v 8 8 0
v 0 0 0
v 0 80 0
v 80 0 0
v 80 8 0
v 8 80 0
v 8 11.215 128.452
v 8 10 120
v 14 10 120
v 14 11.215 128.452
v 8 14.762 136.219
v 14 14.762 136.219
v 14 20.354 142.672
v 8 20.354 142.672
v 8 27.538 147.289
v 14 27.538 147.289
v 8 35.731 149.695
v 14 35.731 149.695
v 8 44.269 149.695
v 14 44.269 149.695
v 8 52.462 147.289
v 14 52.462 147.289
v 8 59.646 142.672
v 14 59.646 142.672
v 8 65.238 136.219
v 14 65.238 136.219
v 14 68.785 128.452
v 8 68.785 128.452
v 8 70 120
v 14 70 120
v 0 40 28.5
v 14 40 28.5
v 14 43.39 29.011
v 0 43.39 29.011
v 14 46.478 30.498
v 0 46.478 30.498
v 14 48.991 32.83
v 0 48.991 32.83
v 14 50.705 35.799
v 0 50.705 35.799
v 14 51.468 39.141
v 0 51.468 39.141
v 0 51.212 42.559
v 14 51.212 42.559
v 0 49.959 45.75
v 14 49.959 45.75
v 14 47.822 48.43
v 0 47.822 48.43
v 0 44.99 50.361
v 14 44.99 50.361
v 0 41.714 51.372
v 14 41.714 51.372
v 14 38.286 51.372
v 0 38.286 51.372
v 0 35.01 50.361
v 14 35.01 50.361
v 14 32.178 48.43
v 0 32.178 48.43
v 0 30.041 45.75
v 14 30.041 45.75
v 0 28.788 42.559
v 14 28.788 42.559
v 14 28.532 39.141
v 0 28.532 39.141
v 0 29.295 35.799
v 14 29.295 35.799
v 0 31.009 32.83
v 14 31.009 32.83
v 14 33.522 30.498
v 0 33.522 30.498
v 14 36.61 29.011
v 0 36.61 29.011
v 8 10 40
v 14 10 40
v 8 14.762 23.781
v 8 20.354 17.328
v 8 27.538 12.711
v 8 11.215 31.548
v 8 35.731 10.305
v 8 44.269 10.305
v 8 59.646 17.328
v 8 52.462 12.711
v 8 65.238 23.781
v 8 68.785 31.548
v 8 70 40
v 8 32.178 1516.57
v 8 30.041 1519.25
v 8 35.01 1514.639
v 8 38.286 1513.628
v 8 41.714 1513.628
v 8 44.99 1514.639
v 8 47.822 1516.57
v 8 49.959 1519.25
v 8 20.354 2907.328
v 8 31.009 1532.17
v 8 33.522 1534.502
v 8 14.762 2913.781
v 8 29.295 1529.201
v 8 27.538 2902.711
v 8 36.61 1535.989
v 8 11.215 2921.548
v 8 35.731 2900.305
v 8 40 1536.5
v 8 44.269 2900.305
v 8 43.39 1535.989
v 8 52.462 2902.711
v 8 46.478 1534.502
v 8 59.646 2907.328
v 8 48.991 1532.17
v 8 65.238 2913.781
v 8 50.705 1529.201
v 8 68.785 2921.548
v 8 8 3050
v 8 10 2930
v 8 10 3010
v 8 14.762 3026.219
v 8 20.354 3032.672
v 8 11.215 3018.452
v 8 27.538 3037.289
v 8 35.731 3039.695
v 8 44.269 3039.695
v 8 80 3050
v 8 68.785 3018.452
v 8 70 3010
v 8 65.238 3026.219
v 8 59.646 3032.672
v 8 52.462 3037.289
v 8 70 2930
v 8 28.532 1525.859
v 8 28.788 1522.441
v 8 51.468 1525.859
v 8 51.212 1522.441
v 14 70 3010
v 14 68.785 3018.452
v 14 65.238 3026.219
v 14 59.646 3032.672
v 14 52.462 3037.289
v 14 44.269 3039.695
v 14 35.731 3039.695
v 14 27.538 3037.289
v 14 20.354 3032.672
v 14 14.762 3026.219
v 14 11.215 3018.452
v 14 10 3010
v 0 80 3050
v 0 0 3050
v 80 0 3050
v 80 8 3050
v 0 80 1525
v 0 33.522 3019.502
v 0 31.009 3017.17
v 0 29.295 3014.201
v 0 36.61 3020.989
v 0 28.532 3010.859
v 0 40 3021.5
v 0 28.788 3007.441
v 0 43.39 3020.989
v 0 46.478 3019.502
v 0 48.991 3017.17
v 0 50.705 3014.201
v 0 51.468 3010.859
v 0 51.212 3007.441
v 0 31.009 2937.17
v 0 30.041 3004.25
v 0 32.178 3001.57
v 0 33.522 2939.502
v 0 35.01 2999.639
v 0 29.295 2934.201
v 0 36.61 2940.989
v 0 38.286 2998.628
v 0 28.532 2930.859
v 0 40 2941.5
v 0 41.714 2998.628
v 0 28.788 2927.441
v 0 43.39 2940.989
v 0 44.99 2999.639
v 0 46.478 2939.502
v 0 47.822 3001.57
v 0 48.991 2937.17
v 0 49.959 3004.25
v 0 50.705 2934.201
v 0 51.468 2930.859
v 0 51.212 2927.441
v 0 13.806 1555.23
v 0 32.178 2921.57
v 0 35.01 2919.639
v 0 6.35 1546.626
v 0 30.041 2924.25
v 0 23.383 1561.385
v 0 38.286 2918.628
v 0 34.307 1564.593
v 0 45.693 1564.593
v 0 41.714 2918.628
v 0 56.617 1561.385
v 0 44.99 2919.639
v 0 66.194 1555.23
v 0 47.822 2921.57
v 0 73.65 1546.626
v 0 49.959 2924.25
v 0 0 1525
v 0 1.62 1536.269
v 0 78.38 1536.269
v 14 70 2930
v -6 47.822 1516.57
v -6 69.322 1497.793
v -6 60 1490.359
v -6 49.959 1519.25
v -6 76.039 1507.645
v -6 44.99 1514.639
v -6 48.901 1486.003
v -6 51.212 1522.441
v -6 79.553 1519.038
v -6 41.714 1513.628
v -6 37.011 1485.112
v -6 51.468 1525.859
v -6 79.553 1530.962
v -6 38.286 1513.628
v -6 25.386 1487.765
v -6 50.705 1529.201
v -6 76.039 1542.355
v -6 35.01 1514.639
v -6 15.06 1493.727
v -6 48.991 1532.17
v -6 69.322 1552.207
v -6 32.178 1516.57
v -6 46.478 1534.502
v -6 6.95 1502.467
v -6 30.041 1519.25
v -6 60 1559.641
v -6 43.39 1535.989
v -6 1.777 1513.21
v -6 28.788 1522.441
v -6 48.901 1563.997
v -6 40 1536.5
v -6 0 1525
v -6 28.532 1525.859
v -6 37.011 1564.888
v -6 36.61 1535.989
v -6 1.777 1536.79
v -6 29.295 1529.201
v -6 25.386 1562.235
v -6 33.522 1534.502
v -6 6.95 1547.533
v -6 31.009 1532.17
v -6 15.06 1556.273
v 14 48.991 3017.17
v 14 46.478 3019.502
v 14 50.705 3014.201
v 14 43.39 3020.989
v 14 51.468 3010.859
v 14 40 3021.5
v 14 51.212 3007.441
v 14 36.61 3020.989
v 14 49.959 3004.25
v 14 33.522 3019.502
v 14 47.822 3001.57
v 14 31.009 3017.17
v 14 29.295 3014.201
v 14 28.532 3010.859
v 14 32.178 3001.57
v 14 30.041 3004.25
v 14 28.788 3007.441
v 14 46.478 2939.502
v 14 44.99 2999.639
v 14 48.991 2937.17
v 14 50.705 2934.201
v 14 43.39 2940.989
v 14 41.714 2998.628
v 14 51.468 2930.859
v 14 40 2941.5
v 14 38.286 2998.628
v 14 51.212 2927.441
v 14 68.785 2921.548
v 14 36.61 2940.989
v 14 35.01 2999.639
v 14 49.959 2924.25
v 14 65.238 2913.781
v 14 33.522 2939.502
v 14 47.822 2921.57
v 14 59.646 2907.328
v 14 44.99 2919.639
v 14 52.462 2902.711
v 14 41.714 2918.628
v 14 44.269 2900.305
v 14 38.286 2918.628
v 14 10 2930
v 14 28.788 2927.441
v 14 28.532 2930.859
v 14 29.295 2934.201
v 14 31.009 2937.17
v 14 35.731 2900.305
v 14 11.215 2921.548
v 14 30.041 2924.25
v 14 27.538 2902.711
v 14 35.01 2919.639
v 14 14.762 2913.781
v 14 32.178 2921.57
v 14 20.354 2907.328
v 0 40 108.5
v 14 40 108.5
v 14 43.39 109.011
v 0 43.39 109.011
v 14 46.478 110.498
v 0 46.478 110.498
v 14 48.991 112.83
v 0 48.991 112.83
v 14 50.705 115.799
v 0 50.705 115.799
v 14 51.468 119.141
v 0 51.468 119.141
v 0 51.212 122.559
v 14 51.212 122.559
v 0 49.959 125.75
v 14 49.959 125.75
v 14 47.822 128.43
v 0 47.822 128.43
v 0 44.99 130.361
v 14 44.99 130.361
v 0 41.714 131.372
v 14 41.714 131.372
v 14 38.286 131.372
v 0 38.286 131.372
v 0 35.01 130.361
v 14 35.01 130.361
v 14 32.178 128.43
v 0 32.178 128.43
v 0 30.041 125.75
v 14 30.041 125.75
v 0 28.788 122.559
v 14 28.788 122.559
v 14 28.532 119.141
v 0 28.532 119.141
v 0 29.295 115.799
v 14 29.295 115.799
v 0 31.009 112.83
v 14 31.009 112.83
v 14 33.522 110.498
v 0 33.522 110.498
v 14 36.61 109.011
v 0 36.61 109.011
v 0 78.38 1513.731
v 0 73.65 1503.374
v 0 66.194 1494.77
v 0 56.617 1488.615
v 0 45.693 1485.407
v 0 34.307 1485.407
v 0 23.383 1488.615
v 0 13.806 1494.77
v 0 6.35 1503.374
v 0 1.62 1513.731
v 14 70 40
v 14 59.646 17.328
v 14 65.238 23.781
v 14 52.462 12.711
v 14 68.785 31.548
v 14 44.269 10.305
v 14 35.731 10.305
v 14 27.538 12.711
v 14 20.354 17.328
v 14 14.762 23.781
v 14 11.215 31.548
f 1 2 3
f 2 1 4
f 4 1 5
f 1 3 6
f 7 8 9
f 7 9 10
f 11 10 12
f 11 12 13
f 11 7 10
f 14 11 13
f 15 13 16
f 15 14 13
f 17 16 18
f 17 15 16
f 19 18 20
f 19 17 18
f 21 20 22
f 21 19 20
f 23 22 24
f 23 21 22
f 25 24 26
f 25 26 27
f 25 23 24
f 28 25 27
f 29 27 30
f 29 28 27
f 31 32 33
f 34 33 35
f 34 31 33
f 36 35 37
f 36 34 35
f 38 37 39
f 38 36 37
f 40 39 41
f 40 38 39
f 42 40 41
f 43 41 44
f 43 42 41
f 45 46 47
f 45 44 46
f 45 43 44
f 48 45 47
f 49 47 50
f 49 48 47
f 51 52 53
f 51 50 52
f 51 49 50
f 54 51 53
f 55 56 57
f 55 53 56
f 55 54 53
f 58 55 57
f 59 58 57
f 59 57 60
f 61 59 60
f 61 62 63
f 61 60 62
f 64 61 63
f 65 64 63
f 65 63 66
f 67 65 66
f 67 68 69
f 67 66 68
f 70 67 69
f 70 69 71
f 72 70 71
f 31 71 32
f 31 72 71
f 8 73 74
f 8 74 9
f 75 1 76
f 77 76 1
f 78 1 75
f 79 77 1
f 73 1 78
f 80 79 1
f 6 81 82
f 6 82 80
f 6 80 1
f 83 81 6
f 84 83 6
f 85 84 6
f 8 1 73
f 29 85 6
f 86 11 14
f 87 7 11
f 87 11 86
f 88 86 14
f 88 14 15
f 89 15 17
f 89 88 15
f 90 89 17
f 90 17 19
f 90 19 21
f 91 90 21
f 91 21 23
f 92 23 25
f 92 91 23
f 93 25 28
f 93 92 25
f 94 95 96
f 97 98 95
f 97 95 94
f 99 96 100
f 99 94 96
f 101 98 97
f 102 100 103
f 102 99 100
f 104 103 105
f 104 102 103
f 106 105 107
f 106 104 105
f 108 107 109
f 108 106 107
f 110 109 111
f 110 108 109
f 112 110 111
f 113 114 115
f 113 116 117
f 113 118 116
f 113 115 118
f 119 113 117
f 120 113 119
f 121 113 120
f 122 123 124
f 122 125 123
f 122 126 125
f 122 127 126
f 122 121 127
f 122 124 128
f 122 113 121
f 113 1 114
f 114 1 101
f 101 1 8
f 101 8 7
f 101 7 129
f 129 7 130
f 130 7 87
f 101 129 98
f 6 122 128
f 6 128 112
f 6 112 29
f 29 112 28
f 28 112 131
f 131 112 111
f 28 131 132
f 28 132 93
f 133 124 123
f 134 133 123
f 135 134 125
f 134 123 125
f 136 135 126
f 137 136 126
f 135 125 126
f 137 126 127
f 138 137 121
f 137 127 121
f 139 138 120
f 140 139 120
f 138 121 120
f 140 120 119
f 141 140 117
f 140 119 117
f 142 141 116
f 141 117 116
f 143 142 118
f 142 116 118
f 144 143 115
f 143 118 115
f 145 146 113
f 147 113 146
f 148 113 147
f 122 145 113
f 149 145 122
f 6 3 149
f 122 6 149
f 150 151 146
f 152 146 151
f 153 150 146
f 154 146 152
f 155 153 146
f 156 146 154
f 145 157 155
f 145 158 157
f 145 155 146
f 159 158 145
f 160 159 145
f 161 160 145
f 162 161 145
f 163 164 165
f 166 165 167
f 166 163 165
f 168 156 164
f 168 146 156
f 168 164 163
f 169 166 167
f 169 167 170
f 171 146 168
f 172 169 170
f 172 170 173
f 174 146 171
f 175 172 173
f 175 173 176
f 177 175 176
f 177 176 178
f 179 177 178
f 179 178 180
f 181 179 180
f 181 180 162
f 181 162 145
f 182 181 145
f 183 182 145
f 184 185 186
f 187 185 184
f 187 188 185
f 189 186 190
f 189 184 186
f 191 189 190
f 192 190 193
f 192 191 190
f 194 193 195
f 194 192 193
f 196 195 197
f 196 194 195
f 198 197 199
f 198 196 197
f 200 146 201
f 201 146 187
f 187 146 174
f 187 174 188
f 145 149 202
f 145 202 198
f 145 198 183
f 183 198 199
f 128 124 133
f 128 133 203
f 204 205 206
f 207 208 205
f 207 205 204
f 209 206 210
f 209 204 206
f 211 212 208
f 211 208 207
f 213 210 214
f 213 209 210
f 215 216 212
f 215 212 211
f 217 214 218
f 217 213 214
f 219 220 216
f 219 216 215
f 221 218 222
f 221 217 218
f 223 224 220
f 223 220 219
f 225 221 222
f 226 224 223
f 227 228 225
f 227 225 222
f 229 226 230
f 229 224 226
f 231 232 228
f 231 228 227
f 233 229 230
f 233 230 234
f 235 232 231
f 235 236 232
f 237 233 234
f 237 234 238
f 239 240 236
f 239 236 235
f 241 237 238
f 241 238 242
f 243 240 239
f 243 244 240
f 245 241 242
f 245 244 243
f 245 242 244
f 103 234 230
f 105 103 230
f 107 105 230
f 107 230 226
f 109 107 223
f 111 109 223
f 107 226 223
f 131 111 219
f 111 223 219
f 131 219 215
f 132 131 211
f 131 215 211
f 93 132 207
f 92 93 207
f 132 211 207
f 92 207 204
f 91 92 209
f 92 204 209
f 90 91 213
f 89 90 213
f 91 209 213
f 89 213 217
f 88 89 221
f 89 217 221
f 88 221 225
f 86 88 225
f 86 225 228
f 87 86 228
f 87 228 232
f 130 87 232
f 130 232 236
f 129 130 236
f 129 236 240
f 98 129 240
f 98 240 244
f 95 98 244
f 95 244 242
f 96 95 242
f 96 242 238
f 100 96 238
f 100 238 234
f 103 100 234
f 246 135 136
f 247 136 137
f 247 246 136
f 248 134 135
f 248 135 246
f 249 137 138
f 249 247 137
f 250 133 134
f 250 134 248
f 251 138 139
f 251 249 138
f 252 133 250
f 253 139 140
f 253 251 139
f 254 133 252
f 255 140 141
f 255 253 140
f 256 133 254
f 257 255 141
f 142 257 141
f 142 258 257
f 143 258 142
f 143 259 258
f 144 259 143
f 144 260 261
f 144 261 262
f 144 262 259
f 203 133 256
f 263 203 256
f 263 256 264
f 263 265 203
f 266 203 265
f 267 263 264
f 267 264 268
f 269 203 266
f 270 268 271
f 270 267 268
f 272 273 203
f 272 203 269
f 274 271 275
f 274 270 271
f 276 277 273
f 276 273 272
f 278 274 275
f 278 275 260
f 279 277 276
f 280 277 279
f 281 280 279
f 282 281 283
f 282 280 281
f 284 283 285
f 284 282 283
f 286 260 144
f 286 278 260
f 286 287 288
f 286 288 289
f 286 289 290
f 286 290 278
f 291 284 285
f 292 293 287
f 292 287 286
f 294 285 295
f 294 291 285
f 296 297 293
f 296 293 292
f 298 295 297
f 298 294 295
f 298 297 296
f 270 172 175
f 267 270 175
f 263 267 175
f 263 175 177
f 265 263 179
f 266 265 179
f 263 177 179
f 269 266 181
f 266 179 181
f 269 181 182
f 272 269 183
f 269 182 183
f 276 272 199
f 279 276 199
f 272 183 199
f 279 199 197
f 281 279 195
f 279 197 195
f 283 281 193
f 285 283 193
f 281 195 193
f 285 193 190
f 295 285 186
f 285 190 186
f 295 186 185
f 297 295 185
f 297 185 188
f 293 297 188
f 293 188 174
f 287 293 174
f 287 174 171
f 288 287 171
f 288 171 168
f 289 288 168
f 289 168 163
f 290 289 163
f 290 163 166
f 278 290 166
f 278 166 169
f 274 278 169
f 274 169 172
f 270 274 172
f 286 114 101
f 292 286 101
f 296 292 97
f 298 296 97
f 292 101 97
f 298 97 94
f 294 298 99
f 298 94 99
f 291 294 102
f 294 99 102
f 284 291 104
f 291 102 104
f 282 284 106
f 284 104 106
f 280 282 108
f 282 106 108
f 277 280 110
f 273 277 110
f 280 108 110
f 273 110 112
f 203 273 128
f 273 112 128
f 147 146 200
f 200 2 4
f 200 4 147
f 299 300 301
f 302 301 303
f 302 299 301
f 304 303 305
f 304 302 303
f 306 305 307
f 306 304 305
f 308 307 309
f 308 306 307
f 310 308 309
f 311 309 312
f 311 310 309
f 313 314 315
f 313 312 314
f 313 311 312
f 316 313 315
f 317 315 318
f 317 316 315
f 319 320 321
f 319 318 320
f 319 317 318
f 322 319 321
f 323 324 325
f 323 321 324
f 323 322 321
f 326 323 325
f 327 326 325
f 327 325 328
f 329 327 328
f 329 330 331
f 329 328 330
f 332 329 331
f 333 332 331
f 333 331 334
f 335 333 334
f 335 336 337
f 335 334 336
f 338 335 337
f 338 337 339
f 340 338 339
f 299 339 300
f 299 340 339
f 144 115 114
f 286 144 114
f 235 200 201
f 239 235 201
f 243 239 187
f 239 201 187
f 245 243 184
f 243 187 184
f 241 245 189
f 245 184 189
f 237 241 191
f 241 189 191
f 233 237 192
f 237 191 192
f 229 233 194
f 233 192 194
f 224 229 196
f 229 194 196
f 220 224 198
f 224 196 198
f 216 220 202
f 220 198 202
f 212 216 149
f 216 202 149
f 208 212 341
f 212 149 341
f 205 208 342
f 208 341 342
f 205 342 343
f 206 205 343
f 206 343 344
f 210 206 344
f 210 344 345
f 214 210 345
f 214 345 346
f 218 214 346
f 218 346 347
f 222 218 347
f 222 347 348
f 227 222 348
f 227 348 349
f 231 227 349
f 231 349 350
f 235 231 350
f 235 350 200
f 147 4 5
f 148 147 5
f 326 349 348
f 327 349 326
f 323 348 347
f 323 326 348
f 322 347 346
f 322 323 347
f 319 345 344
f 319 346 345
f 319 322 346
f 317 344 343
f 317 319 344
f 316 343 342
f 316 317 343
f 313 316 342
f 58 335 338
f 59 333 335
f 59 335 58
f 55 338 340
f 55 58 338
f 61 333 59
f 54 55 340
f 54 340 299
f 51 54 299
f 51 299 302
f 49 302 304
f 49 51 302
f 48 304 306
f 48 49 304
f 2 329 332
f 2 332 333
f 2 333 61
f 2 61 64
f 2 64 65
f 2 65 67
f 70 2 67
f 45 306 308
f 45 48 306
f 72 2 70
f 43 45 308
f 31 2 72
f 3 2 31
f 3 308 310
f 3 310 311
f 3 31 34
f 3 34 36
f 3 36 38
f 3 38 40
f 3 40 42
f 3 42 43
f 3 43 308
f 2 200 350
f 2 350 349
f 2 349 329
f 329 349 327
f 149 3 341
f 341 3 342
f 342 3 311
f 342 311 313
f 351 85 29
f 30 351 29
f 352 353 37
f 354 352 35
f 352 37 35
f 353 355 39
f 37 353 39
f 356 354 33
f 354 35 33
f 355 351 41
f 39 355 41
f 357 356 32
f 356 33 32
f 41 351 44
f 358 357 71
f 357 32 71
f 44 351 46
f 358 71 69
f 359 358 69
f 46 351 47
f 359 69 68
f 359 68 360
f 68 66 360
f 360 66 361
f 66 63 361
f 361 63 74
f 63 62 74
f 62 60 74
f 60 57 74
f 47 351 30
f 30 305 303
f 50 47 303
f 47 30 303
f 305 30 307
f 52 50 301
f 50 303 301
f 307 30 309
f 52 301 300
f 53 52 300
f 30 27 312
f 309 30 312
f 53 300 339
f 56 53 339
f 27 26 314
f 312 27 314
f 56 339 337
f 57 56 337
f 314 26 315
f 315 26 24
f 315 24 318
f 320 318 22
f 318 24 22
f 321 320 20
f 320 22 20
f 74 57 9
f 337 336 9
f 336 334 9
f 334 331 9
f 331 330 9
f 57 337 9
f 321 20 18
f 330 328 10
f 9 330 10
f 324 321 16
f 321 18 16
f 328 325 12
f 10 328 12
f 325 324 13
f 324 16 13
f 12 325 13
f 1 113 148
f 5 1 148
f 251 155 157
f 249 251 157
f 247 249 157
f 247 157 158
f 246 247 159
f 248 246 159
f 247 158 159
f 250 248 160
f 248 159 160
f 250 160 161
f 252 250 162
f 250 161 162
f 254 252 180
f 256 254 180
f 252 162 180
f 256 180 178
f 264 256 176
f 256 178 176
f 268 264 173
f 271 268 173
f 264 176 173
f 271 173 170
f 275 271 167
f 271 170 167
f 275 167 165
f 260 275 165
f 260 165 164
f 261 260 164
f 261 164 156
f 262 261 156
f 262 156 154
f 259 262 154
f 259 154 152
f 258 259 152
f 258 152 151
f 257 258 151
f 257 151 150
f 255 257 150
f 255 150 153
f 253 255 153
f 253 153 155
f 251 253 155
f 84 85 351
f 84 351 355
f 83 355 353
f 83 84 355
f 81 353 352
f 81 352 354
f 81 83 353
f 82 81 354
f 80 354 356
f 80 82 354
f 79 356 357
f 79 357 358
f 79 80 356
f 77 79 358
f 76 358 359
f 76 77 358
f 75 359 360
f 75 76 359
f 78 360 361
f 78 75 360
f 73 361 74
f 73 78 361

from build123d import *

# Parameters (mm, degrees)
SKETCH_1_W          = 80
SKETCH_1_H          = 80
EXTRUDE_1_DEPTH     = 3050
SKETCH_2_W          = 72
SKETCH_2_H          = 72
CUT_EXTRUDE_1_DEPTH = 3053.097639329
SKETCH_5_R          = 40
EXTRUDE_2_DEPTH     = 6
SKETCH_6_R          = 11.5
CUT_EXTRUDE_2_DEPTH = 3053.260801439
SKETCH_7_R          = 30
EXTRUDE_3_DEPTH     = 6
SKETCH_8_W          = 80
SKETCH_8_H          = 60
EXTRUDE_4_DEPTH     = 6
SKETCH_9_R          = 11.5
CUT_EXTRUDE_3_DEPTH = 3053.097639329


with BuildPart() as part:
    # 草图1 → 凸台-拉伸1 (new body)
    with BuildSketch(Plane.XY):
        with Locations((40, 40)):
            Rectangle(SKETCH_1_W, SKETCH_1_H)
    extrude(amount=EXTRUDE_1_DEPTH)

    # 草图2 → 切除-拉伸1 (cut, through all)
    with BuildSketch(Plane.XY.offset(3050)):
        with Locations((44, 44)):
            Rectangle(SKETCH_2_W, SKETCH_2_H)
    extrude(amount=-CUT_EXTRUDE_1_DEPTH, mode=Mode.SUBTRACT)

    # 草图5 → 凸台-拉伸2 (add)
    with BuildSketch(Plane.ZY):
        with Locations(Location((1525, 40, 0), (0, 0, 270))):
            Circle(SKETCH_5_R)
    extrude(amount=EXTRUDE_2_DEPTH)

    # 草图6 → 切除-拉伸2 (cut, through all)
    with BuildSketch(Plane.ZY.offset(6)):
        with Locations((1525, 40)):
            Circle(SKETCH_6_R)
    extrude(amount=-CUT_EXTRUDE_2_DEPTH, mode=Mode.SUBTRACT)

    # 草图7 → 凸台-拉伸3 (add)
    with BuildSketch(Plane(origin=(8, 0, 0), x_dir=(0, 0, -1), z_dir=(1, 0, 0))):
        with Locations(Location((-3010, 40, 0), (0, 0, 270))):
            Circle(SKETCH_7_R)
        with Locations(Location((-2930, 40, 0), (0, 0, 270))):
            Circle(SKETCH_7_R)
    extrude_3 = extrude(amount=EXTRUDE_3_DEPTH)

    # 草图8 → 凸台-拉伸4 (add)
    with BuildSketch(Plane(origin=(8, 0, 0), x_dir=(0, 0, -1), z_dir=(1, 0, 0))):
        with Locations((-2970, 40)):
            Rectangle(SKETCH_8_W, SKETCH_8_H)
    extrude_4 = extrude(amount=EXTRUDE_4_DEPTH)

    # 草图9 → 切除-拉伸3 (cut, through all)
    with BuildSketch(Plane.ZY):
        with Locations((3010, 40)):
            Circle(SKETCH_9_R)
        with Locations((2930, 40)):
            Circle(SKETCH_9_R)
    cut_extrude_3 = extrude(amount=-CUT_EXTRUDE_3_DEPTH, mode=Mode.SUBTRACT)

    # 镜向1: 凸台-拉伸3, 凸台-拉伸4, 切除-拉伸3 across plane
    add(extrude_3.mirror(Plane.XY.offset(1525)))
    add(extrude_4.mirror(Plane.XY.offset(1525)))
    add(cut_extrude_3.mirror(Plane.XY.offset(1525)), mode=Mode.SUBTRACT)


solid = part.part
